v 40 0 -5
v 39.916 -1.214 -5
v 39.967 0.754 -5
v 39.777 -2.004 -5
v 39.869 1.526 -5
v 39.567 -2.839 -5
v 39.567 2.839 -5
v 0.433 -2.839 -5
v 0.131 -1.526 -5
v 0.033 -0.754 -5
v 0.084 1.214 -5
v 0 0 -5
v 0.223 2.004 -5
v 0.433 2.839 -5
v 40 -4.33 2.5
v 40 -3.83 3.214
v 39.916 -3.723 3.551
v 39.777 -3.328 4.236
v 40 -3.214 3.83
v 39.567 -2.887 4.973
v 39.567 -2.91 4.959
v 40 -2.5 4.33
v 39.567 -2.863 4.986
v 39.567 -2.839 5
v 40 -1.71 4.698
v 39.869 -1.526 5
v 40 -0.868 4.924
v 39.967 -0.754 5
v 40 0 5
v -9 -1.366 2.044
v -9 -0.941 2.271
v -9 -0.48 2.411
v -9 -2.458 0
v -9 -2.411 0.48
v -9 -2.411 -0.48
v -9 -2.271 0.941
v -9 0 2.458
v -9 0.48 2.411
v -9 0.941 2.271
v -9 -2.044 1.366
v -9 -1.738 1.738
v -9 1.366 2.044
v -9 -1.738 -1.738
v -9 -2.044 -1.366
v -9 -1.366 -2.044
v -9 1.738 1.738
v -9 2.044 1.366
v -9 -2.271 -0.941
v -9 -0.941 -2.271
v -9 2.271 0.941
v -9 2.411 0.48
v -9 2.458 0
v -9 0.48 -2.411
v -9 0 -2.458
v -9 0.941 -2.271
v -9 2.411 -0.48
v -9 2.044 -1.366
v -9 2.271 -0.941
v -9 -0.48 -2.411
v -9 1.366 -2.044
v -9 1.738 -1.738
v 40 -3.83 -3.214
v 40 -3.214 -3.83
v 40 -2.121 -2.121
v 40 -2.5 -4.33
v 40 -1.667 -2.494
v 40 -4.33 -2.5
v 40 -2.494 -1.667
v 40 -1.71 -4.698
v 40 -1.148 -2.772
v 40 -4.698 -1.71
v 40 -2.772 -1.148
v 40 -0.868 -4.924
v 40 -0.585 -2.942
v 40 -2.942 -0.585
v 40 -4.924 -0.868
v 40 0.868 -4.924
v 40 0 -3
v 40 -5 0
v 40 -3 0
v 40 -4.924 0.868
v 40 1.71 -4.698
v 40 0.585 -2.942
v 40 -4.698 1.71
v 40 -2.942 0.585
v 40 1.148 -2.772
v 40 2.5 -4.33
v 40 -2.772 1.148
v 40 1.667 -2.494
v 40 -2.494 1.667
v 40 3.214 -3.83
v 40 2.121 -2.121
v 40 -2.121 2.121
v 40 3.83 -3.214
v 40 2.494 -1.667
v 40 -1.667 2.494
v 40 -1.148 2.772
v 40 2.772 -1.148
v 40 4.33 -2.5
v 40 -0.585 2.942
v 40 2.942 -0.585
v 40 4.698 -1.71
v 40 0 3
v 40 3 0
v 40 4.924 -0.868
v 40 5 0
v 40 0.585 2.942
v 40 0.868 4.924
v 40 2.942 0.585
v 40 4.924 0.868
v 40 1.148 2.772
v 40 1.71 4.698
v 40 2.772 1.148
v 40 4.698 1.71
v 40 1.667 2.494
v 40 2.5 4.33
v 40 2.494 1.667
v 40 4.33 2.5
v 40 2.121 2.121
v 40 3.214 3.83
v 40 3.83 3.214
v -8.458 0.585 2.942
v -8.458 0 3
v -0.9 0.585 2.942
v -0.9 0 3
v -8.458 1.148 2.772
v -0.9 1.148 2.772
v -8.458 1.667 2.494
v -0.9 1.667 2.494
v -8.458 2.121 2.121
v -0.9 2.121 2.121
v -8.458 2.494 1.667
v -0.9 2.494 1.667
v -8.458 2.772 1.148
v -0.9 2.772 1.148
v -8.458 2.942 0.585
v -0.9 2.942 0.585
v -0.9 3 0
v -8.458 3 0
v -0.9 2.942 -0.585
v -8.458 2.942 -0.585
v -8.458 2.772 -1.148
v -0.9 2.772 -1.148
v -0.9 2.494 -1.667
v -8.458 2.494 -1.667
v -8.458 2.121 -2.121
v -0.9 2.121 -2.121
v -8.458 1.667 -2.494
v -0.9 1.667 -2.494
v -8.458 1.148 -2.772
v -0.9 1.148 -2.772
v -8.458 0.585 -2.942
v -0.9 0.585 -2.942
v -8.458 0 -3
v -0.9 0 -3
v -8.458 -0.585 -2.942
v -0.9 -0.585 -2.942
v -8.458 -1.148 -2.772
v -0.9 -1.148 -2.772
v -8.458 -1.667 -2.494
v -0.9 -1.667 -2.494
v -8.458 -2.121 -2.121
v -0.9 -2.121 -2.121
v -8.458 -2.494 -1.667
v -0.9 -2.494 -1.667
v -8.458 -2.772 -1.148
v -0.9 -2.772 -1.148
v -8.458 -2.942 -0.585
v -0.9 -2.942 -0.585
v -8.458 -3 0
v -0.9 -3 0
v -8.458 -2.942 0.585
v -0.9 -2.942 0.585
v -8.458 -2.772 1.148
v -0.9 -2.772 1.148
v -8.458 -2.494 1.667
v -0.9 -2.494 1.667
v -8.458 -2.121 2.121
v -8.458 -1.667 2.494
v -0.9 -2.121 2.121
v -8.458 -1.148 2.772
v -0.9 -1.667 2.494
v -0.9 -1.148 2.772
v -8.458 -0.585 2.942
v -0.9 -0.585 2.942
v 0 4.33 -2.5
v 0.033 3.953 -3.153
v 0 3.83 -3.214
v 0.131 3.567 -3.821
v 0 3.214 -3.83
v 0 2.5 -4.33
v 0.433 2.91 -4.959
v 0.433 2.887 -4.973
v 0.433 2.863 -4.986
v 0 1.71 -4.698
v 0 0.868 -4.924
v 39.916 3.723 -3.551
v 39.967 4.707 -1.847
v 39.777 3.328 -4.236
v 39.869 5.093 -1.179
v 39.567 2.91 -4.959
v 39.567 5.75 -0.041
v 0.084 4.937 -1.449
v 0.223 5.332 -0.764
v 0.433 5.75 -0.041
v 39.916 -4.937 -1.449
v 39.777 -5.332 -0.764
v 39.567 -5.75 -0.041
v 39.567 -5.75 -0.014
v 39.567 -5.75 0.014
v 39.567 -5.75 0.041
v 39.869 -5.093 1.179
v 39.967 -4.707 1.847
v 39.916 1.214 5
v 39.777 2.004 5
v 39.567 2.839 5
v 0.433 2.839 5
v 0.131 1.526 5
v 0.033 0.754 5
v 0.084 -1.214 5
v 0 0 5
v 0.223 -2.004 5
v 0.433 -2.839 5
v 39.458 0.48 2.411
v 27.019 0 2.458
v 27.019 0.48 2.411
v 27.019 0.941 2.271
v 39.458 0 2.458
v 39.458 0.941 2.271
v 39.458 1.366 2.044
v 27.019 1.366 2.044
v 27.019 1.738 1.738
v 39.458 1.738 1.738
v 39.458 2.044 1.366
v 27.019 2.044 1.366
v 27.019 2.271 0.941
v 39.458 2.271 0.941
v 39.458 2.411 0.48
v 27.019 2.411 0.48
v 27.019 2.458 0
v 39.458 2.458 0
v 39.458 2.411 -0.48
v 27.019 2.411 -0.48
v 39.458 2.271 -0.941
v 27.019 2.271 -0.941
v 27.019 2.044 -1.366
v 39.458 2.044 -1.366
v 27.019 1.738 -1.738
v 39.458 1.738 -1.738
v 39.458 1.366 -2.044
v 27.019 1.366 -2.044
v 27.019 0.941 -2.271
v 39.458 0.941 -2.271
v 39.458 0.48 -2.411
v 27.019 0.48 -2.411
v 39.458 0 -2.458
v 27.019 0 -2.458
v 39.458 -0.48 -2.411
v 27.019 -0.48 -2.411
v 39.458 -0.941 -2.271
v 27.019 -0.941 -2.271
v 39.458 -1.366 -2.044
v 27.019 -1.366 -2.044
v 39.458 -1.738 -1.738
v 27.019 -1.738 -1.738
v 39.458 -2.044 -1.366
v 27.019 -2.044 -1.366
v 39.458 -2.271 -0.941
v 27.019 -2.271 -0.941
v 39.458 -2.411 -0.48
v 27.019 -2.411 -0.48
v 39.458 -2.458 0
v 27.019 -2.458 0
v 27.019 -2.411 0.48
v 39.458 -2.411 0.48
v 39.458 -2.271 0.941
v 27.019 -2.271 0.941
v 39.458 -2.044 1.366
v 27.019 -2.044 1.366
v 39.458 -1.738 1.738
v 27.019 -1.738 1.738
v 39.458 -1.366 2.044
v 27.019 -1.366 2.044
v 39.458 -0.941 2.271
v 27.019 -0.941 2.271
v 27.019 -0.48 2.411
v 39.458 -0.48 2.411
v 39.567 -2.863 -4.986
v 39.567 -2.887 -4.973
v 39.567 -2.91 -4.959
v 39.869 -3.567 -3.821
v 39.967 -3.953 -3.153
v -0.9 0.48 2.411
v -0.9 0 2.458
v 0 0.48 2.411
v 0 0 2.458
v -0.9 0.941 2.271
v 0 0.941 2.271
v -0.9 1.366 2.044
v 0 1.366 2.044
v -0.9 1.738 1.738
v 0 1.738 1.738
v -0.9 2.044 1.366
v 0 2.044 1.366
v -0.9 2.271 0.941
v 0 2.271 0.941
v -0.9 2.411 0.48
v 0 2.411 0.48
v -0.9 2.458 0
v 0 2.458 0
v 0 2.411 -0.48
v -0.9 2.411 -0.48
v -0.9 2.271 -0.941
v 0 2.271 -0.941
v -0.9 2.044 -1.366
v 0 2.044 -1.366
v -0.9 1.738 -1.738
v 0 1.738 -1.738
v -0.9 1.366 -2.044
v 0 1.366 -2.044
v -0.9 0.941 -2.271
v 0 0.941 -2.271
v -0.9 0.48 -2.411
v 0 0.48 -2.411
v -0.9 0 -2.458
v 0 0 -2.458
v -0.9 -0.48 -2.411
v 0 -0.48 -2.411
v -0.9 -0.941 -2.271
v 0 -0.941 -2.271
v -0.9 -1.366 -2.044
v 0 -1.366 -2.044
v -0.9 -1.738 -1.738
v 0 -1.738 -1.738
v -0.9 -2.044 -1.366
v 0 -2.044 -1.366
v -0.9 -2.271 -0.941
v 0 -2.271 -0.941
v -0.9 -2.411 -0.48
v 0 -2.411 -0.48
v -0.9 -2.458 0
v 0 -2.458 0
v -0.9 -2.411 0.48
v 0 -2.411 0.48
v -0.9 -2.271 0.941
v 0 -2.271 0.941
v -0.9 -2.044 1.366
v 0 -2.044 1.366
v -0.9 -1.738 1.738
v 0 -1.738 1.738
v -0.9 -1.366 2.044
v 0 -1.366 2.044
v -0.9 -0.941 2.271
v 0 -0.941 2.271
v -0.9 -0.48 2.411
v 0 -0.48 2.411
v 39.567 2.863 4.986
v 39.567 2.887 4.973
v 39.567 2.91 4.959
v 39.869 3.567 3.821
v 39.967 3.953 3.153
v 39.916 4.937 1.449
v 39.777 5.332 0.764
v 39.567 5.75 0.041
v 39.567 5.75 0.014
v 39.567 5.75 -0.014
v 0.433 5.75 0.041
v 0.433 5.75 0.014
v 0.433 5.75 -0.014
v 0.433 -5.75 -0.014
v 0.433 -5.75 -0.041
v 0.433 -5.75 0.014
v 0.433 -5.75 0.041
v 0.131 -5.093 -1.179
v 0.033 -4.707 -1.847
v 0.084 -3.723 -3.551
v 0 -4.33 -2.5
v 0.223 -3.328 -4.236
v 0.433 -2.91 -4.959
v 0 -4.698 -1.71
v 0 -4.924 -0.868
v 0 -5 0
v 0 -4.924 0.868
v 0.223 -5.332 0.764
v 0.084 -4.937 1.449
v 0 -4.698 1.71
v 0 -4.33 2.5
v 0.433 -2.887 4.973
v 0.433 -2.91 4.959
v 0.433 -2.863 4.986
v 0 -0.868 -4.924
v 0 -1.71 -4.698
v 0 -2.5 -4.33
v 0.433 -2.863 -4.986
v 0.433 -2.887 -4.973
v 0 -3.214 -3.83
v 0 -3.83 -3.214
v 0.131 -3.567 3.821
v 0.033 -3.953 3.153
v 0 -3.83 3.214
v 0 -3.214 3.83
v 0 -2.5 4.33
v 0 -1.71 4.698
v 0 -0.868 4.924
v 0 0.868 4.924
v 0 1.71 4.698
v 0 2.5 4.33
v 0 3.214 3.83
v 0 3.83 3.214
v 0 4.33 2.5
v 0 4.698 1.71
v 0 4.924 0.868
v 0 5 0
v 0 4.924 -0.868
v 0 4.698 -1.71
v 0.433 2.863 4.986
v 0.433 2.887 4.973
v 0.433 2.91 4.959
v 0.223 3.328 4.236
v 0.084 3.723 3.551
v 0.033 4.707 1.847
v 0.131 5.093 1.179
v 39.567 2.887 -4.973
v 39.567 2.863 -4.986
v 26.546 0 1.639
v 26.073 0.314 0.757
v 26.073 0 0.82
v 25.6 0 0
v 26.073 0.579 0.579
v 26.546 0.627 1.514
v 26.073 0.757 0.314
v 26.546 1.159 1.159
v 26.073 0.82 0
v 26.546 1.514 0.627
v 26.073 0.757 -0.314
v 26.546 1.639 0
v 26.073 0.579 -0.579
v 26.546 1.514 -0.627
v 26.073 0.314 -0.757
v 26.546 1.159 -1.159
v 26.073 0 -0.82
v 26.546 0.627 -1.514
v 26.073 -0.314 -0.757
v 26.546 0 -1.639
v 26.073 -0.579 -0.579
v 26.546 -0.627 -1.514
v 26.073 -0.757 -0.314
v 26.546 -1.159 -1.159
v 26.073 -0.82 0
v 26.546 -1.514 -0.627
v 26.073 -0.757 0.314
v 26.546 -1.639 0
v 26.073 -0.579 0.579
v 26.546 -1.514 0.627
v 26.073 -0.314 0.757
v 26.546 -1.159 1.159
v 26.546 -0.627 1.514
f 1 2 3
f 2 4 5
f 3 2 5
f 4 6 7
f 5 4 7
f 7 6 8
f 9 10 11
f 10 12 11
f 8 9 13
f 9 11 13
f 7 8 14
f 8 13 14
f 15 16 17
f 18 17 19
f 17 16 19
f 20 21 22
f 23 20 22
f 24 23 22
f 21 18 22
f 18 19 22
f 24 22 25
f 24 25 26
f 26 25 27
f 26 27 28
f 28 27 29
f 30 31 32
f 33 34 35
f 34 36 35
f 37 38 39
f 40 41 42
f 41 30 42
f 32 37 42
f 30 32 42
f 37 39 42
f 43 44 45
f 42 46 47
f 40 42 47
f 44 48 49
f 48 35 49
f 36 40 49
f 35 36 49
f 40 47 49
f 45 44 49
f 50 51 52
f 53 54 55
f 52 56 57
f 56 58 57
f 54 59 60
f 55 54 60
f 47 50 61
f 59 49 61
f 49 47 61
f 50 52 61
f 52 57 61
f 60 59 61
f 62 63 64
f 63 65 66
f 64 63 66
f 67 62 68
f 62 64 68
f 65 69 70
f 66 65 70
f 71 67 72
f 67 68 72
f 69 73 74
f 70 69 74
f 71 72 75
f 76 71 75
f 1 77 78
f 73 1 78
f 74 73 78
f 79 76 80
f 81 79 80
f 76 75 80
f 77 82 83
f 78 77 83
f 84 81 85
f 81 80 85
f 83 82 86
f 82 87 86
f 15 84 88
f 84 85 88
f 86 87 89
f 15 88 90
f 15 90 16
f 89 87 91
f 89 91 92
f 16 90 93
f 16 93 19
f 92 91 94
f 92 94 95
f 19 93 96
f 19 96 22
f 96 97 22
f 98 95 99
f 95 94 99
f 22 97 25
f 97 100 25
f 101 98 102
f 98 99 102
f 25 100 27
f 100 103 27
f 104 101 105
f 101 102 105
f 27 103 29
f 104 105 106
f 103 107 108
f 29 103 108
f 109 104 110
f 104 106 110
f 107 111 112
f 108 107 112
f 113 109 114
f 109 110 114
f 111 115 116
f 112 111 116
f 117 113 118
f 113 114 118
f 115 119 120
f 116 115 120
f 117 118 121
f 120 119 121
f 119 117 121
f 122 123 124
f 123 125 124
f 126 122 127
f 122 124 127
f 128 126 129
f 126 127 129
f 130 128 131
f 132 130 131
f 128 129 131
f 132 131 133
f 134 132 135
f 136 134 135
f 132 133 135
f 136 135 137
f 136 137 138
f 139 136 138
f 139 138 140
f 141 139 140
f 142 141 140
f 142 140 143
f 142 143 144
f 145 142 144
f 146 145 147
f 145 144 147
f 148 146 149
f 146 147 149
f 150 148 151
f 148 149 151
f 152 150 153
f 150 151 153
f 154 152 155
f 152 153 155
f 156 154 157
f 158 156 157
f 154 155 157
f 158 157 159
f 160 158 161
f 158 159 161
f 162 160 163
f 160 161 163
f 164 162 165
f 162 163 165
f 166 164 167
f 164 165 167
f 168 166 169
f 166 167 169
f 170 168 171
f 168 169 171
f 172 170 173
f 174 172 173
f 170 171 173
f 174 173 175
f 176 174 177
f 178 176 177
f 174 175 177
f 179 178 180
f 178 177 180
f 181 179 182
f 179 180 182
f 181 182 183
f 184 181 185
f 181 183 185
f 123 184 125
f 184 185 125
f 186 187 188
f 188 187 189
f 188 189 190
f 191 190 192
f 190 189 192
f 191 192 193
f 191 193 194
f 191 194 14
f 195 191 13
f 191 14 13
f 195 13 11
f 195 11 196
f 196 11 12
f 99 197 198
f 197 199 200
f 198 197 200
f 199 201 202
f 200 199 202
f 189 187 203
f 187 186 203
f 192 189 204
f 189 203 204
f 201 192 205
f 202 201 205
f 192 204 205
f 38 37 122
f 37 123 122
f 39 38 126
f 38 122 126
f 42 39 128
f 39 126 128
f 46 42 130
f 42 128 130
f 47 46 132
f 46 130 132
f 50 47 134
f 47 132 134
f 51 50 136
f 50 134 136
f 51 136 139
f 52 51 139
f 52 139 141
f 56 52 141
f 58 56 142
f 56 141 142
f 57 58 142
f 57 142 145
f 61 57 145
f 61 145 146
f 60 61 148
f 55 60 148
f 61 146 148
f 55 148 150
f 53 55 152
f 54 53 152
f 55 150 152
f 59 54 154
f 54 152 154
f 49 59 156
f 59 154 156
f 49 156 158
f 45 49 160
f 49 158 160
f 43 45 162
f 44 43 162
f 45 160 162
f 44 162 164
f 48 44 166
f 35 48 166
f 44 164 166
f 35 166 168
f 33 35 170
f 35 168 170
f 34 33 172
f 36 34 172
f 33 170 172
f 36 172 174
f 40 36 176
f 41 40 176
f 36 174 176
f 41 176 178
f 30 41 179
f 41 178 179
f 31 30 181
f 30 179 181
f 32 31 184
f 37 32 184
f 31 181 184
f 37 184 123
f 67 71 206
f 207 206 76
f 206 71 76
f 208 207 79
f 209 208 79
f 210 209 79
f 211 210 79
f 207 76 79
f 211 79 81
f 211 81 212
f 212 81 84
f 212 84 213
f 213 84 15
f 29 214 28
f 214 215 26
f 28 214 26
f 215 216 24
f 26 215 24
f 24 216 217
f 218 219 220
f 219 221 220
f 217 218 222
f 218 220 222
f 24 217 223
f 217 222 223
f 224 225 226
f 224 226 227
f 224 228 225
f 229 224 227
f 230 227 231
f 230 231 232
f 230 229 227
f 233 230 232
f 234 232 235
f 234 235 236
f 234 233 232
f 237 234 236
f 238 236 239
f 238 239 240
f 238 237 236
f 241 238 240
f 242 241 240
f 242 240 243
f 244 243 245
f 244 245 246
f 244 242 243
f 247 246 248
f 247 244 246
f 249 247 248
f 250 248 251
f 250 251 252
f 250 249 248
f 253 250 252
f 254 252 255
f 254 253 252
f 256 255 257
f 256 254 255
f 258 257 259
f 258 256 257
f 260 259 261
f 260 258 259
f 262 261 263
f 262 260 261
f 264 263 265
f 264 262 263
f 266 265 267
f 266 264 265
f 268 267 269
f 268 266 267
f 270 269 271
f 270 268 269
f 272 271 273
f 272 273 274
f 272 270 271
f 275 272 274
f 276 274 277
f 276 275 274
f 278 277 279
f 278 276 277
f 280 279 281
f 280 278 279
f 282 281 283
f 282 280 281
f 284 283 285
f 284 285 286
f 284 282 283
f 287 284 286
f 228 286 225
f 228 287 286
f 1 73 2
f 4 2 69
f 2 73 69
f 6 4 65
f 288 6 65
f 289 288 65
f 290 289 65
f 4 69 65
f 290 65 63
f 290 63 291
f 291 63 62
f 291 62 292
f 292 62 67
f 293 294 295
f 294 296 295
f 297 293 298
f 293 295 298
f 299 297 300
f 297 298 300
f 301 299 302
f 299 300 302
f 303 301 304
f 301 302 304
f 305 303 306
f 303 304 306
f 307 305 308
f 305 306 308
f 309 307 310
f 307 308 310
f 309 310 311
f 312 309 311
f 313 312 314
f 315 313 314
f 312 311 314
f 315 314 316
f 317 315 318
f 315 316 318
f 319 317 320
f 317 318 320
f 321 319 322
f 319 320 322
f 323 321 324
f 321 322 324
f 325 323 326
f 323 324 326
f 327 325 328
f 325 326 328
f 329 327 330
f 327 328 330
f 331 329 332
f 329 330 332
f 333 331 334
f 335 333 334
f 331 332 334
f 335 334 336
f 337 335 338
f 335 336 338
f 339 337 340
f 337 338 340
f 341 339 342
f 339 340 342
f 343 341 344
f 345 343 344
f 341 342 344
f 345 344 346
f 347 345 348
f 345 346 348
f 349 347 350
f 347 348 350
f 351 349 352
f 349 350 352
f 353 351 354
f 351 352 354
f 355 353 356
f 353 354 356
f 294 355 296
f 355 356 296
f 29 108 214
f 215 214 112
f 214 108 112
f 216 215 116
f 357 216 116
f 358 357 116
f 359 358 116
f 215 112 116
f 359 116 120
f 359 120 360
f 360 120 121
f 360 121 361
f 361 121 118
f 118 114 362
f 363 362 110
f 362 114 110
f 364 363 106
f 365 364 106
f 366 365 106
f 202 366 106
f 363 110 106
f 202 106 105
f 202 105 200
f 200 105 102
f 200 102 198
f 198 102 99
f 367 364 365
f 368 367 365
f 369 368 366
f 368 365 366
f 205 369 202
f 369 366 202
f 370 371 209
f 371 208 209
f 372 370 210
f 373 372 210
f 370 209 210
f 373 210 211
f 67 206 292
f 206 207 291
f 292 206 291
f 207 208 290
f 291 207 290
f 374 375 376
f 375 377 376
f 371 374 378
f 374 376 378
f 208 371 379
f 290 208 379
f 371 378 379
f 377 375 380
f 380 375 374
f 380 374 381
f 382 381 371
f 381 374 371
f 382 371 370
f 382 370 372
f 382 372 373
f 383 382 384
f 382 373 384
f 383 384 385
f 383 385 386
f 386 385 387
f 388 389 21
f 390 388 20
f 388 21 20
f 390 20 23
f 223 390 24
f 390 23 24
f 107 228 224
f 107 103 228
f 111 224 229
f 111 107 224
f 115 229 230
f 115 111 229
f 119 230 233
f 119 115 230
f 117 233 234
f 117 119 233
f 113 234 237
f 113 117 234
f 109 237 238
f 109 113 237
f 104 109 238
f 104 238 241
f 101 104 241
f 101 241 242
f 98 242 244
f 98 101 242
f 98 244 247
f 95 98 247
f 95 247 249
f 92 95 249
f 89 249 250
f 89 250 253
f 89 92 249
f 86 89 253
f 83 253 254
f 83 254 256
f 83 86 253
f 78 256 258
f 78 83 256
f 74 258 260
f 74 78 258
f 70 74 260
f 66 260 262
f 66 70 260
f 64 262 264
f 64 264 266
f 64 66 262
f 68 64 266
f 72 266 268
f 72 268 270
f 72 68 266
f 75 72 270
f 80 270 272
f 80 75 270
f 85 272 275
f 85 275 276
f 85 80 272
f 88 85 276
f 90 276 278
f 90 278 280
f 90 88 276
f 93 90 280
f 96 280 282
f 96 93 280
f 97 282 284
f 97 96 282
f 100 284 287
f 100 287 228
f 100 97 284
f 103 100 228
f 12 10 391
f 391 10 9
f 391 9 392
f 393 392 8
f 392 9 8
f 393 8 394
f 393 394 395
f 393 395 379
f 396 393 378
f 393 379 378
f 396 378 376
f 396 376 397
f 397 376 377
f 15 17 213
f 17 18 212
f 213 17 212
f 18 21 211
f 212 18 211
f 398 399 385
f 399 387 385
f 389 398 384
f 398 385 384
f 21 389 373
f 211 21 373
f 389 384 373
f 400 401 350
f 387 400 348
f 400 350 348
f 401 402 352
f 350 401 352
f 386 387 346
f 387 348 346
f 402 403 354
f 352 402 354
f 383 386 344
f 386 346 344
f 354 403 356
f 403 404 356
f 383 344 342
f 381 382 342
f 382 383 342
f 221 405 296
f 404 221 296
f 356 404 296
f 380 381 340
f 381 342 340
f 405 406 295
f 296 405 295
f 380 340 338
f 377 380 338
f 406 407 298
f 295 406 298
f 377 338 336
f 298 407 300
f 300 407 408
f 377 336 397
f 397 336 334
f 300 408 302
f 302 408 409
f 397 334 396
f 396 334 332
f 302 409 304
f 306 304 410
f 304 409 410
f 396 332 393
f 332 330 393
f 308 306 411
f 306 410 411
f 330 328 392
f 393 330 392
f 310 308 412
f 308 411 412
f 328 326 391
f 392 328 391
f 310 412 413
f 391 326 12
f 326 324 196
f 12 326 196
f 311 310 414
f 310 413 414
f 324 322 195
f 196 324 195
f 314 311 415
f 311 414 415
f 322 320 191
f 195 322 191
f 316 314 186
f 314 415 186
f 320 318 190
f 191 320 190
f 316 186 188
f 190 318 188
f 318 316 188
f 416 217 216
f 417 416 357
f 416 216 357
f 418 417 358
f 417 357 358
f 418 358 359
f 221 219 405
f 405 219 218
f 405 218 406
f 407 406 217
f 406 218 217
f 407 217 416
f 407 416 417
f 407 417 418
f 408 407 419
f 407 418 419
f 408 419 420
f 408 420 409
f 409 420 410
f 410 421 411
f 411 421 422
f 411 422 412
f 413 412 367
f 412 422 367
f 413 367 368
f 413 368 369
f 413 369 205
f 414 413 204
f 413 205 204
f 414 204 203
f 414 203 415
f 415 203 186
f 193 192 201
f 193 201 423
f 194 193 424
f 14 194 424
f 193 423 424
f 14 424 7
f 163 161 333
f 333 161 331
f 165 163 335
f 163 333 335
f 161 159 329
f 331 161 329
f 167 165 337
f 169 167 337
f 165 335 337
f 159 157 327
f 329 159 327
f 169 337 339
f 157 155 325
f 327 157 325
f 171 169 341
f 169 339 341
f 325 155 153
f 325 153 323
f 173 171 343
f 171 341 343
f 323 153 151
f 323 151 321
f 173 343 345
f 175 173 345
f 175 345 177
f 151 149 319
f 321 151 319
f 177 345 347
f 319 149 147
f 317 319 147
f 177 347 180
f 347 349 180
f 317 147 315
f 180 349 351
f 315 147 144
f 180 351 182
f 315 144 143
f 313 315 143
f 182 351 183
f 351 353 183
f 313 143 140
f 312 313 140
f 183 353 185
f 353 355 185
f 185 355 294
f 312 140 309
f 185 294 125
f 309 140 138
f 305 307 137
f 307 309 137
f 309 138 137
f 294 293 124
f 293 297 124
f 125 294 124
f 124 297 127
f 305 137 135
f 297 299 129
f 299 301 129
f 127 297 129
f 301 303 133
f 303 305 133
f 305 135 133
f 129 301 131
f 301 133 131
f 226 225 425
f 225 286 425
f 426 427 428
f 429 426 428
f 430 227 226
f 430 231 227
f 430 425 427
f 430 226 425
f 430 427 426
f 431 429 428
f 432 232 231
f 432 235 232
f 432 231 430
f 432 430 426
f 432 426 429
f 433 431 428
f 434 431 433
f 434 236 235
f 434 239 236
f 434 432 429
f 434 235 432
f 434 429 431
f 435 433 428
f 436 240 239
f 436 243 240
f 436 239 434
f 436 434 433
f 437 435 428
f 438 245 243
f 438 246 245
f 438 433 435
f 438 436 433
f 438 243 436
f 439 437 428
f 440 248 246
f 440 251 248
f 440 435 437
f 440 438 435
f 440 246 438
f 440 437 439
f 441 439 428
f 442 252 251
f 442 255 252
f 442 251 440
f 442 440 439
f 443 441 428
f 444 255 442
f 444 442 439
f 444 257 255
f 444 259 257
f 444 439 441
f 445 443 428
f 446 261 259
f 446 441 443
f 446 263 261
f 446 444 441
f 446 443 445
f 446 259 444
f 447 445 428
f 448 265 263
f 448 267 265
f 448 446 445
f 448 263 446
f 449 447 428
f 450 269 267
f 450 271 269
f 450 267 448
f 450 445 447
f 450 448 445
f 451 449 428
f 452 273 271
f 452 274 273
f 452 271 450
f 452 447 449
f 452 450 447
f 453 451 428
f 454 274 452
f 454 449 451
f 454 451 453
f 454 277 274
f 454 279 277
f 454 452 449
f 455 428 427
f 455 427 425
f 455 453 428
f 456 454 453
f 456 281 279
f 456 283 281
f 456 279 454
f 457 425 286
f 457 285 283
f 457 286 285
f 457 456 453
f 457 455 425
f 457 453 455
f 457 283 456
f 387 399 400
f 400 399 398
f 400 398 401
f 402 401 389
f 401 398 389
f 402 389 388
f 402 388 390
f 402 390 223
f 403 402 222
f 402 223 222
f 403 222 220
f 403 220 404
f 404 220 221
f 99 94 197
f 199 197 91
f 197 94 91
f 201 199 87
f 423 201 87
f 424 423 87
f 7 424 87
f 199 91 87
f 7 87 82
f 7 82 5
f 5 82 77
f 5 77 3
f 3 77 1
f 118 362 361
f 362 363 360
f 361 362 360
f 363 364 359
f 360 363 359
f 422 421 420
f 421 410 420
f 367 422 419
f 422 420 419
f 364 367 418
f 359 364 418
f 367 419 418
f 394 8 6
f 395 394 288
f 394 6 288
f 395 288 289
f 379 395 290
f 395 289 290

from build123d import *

# Parameters (mm, degrees)
SKETCH2_W          = 20
SKETCH2_H          = 20
CUT_EXTRUDE1_DEPTH = 40


with BuildPart() as part:
    # Sketch1 → Revolve1 (revolve)
    with BuildSketch(Plane.XY, mode=Mode.PRIVATE) as revolve1_sk:
        Polygon((0, 0), (0, 5), (0.433012702, 5.75), (39.566987298, 5.75), (40, 5), (40, 0), align=None)
    revolve(revolve1_sk.sketch.rotate(Axis((40, 0, 0), (-1, 0, 0)), 270), axis=Axis((40, 0, 0), (-1, 0, 0)))

    # Sketch2 → Cut-Extrude1 (cut)
    with BuildSketch(Plane(origin=(0, 0, 0), x_dir=(0, 0, -1), z_dir=(1, 0, 0))):
        Rectangle(SKETCH2_W, SKETCH2_H)
        Polygon((-5, 2.886751346), (-5, -2.886751346), (0, -5.773502692), (5, -2.886751346), (5, 2.886751346), (0, 5.773502692), align=None, mode=Mode.SUBTRACT)
    extrude(amount=CUT_EXTRUDE1_DEPTH, mode=Mode.SUBTRACT)

    # Sketch3 → Cut-Revolve1 (revolve, cut)
    with BuildSketch(Plane.XY, mode=Mode.PRIVATE) as cut_revolve1_sk:
        Polygon((25.6, 0), (27.019415637, 2.4585), (39.4585, 2.4585), (40, 3), (40, 0), align=None)
    revolve(cut_revolve1_sk.sketch.rotate(Axis((40, 0, 0), (-1, 0, 0)), 270), axis=Axis((40, 0, 0), (-1, 0, 0)), mode=Mode.SUBTRACT)

    # Sketch4 → Revolve2 (revolve)
    with BuildSketch(Plane.XY, mode=Mode.PRIVATE) as revolve2_sk:
        Polygon((-9, 0), (-9, 2.4585), (-8.4585, 3), (-0.9, 3), (-0.9, 2.4585), (0, 2.4585), (0, 0), align=None)
    revolve(revolve2_sk.sketch.rotate(Axis((0, 0, 0), (-1, 0, 0)), 270), axis=Axis((0, 0, 0), (-1, 0, 0)))


solid = part.part
